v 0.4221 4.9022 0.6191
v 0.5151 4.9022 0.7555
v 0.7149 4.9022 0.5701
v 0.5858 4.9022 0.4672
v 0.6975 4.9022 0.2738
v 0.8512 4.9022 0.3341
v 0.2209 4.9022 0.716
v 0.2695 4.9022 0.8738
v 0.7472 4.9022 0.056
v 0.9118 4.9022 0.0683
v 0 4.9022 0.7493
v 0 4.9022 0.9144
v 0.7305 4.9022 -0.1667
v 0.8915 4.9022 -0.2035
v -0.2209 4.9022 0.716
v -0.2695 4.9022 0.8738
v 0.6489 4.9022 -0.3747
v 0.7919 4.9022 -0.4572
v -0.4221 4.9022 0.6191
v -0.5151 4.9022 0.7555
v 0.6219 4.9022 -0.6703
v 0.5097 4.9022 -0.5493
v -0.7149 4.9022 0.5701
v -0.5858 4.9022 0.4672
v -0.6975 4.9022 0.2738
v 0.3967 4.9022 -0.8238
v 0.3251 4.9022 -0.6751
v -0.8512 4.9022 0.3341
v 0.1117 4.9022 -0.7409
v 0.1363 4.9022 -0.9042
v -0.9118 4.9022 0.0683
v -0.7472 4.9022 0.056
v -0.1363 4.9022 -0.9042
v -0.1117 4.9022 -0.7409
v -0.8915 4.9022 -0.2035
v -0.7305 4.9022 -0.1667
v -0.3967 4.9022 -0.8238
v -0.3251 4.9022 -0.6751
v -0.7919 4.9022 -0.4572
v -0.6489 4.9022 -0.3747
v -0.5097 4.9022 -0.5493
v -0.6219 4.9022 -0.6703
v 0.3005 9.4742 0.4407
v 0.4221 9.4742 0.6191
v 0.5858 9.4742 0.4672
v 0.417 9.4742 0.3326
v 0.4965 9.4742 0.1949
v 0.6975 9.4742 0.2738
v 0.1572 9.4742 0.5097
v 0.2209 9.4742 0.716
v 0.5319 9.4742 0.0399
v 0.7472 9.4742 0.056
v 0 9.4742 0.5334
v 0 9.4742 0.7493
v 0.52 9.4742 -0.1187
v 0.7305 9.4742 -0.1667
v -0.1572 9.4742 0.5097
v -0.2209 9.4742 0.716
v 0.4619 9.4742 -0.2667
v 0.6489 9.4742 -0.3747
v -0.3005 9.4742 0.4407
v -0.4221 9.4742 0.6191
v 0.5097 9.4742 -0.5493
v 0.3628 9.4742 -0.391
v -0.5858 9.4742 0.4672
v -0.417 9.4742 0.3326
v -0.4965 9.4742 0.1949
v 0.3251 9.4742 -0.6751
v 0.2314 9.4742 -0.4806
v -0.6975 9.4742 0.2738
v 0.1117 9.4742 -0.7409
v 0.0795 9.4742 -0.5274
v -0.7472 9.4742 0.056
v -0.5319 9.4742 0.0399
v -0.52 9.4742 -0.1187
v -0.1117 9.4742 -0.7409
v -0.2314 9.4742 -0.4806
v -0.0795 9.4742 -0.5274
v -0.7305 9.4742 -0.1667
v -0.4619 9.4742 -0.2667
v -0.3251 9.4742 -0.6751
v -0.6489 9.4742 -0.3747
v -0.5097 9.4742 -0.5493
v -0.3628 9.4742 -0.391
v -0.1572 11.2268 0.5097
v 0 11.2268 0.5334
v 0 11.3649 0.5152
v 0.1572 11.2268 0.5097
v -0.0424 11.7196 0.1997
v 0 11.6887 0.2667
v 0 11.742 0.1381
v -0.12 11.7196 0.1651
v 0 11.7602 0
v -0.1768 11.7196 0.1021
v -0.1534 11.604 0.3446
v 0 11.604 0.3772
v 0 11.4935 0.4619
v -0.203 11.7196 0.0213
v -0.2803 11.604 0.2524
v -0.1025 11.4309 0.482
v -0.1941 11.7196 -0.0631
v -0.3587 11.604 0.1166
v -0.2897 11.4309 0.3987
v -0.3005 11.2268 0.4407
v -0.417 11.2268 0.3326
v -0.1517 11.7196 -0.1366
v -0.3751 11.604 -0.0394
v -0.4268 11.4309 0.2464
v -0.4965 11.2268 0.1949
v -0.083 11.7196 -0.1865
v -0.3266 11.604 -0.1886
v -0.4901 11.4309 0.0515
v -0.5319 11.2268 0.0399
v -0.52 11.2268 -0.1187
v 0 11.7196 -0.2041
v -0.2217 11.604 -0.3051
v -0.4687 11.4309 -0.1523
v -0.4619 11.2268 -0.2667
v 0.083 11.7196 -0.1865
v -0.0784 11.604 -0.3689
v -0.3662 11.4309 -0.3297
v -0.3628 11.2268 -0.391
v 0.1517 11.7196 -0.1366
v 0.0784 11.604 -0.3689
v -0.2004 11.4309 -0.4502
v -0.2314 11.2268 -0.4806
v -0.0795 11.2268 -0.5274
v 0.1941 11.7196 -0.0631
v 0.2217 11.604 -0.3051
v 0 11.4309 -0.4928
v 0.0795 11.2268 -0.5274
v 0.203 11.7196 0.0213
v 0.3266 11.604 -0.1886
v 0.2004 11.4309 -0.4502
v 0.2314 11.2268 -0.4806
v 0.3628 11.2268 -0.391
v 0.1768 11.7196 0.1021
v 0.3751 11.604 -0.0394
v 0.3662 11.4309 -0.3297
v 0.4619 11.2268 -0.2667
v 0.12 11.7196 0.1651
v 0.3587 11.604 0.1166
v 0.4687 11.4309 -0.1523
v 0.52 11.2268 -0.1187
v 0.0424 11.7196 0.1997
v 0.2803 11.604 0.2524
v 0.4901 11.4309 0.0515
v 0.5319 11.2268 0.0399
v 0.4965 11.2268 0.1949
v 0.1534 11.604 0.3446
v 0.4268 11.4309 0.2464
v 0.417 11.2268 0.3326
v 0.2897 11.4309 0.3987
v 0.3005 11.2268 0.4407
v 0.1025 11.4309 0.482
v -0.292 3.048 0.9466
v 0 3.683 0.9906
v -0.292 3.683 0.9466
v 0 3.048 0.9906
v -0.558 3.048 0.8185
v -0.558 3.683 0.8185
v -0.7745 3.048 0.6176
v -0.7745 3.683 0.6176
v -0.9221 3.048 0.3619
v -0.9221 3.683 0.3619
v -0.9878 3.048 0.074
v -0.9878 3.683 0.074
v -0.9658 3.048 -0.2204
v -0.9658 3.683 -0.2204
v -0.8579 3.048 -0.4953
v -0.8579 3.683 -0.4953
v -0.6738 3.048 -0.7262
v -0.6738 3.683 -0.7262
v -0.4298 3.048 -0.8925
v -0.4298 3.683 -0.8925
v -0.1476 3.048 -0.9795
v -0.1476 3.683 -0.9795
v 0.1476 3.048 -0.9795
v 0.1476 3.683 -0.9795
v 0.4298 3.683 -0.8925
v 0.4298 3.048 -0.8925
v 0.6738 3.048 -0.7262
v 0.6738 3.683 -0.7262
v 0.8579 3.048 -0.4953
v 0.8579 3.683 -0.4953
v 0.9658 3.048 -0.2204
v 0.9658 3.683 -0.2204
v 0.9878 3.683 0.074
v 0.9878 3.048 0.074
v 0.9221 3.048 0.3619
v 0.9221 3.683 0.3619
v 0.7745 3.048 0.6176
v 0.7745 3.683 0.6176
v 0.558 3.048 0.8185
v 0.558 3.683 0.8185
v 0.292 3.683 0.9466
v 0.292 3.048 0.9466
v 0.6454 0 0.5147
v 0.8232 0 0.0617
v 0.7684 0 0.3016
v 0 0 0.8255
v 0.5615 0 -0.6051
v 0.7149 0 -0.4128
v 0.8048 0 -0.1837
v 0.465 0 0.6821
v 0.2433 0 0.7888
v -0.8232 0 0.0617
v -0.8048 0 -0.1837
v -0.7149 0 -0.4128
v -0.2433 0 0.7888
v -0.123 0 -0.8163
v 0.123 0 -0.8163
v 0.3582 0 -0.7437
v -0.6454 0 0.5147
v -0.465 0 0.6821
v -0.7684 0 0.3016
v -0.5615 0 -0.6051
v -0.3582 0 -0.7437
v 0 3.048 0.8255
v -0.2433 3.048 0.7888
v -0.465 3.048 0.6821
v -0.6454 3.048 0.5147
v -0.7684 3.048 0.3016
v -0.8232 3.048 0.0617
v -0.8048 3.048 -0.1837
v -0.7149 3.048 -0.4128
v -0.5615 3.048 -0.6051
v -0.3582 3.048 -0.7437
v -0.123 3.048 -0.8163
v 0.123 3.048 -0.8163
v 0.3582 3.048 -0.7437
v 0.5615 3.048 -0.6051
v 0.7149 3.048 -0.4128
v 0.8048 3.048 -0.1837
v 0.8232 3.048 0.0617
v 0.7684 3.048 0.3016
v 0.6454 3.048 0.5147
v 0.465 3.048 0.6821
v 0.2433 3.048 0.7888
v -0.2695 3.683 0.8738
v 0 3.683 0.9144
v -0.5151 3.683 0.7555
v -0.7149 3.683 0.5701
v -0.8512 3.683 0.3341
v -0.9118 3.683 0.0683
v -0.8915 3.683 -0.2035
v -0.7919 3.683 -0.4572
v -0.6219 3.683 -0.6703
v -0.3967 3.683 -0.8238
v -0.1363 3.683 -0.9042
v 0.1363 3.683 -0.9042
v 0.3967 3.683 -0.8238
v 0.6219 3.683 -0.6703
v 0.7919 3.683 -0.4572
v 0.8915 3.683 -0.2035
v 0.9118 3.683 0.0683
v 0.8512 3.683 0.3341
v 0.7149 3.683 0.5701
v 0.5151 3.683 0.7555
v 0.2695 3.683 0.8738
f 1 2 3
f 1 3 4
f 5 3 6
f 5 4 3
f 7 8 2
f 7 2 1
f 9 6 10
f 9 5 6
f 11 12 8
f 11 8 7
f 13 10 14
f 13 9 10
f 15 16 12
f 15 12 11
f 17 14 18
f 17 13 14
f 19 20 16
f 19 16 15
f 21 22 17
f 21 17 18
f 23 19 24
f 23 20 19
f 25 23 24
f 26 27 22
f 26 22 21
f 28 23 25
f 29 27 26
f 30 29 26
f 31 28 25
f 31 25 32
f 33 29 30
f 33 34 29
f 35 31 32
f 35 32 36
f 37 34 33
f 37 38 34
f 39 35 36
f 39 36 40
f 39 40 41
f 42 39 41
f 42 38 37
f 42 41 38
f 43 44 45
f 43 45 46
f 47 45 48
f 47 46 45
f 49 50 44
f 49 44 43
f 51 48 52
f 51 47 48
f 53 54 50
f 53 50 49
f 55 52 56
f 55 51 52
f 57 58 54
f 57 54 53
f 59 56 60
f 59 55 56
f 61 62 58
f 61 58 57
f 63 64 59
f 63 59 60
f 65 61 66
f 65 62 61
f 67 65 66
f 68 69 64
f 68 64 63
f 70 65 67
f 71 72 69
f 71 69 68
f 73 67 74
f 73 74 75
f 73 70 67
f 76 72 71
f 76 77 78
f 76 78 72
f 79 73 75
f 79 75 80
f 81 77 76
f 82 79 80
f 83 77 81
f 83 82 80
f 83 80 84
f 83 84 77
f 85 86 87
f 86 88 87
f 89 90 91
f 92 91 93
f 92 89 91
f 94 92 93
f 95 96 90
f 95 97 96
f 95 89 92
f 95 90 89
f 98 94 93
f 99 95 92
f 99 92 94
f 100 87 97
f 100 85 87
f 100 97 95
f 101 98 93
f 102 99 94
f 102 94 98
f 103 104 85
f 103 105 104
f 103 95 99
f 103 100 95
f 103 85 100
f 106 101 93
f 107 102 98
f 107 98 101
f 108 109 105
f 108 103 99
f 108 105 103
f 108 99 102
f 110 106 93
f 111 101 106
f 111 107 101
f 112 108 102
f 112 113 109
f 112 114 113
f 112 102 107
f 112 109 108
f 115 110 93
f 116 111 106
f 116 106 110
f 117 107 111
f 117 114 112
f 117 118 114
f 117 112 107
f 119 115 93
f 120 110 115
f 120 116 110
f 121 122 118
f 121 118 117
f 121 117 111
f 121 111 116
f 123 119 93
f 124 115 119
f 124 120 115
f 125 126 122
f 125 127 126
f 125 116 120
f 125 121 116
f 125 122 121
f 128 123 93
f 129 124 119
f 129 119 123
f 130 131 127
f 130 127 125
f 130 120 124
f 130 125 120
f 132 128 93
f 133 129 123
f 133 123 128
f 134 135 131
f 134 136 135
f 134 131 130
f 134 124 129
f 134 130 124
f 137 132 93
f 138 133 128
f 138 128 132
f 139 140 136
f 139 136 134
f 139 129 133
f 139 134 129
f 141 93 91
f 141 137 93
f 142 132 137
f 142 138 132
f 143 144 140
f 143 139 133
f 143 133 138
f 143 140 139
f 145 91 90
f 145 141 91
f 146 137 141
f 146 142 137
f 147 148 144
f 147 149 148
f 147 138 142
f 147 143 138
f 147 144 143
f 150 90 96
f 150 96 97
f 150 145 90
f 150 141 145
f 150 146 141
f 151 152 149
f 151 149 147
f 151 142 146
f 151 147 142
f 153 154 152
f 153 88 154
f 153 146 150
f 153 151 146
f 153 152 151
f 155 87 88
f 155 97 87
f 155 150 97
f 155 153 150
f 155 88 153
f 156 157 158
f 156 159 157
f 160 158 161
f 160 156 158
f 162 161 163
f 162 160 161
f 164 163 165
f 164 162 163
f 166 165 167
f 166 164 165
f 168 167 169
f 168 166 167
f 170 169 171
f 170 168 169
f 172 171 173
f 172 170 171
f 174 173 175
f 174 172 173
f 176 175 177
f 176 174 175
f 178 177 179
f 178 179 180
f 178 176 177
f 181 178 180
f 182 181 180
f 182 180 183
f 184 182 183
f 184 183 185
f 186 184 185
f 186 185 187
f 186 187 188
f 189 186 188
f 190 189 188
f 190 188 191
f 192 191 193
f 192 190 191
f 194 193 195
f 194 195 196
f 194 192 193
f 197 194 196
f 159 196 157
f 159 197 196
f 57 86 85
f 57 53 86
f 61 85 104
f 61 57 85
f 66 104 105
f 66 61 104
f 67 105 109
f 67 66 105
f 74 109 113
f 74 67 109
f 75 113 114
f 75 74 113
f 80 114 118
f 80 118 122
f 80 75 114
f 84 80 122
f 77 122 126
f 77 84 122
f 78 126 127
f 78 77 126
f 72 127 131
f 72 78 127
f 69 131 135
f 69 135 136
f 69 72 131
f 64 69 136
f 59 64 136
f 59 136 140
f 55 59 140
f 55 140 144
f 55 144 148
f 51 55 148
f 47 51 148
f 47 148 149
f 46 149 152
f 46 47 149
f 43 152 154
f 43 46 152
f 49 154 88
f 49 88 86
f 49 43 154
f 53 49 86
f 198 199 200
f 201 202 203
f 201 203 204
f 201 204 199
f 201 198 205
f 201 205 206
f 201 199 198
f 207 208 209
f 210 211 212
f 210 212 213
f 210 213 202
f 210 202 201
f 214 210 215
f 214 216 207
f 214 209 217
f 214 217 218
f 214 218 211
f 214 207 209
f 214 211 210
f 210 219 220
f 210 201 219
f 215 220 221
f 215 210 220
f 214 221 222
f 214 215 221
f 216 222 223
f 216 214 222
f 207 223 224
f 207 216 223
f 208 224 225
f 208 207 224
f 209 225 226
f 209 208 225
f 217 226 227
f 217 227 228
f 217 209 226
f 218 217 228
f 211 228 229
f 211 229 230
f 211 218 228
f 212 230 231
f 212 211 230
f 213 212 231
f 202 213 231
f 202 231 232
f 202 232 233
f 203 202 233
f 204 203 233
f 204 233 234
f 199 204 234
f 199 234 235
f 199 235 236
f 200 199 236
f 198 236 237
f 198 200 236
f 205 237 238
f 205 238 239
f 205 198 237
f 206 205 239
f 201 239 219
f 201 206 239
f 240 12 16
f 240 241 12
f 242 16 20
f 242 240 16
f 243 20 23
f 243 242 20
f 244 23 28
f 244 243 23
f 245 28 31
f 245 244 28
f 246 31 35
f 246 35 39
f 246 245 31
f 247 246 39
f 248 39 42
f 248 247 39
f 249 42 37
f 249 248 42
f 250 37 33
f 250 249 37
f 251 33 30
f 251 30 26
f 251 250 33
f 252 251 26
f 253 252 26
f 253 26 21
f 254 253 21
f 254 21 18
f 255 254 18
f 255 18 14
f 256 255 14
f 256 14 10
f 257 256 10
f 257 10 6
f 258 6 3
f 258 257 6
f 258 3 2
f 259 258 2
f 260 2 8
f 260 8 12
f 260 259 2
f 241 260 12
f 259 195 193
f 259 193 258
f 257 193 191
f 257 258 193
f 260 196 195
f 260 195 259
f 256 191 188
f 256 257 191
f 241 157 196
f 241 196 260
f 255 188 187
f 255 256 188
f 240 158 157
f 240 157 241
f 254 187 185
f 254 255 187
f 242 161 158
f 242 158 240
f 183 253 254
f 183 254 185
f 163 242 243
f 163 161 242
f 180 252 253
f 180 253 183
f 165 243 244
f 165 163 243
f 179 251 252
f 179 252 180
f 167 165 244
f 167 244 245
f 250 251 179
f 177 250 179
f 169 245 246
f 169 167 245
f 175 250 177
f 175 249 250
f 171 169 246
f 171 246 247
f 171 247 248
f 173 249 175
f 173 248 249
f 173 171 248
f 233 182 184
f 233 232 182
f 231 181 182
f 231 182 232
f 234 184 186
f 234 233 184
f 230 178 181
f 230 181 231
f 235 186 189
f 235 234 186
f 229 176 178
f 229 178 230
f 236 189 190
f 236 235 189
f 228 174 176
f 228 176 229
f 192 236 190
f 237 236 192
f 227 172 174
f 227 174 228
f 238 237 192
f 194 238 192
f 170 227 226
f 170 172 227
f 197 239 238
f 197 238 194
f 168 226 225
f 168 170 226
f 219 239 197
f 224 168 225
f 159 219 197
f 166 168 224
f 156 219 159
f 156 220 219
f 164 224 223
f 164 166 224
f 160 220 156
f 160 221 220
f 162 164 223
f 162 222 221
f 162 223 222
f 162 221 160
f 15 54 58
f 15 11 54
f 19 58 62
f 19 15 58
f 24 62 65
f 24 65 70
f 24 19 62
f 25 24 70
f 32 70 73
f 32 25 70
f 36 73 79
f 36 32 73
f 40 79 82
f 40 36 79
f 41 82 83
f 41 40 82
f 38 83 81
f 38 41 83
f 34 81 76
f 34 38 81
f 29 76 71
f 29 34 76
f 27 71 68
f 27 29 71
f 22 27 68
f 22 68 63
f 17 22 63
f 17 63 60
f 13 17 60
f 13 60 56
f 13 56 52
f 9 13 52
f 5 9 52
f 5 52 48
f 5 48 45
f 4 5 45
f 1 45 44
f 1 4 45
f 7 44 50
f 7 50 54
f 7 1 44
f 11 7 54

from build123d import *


with BuildPart() as part:
    # Sketch2 → Revolve1 (revolve)
    with BuildSketch(Plane.XY, mode=Mode.PRIVATE) as revolve1_sk:
        with BuildLine():
            Line((0.5334, 11.2268), (0.5334, 9.4742))
            Line((0.5334, 9.4742), (0.7493, 9.4742))
            Line((0.7493, 9.4742), (0.7493, 4.9022))
            Line((0.7493, 4.9022), (0.9144, 4.9022))
            Line((0.9144, 4.9022), (0.9144, 3.683))
            Line((0.9144, 3.683), (0.9906, 3.683))
            Line((0.9906, 3.683), (0.9906, 3.048))
            Line((0.9906, 3.048), (0.8255, 3.048))
            Line((0.8255, 3.048), (0.8255, 0))
            Line((0.8255, 0), (0, 0))
            Line((0, 0), (0, 11.7602))
            ThreePointArc((0, 11.7602), (0.377170757, 11.603970757), (0.5334, 11.2268))
        make_face()
    revolve(revolve1_sk.sketch.rotate(Axis((0, 0, 0), (0, -1, 0)), 90), axis=Axis((0, 0, 0), (0, -1, 0)))


solid = part.part
